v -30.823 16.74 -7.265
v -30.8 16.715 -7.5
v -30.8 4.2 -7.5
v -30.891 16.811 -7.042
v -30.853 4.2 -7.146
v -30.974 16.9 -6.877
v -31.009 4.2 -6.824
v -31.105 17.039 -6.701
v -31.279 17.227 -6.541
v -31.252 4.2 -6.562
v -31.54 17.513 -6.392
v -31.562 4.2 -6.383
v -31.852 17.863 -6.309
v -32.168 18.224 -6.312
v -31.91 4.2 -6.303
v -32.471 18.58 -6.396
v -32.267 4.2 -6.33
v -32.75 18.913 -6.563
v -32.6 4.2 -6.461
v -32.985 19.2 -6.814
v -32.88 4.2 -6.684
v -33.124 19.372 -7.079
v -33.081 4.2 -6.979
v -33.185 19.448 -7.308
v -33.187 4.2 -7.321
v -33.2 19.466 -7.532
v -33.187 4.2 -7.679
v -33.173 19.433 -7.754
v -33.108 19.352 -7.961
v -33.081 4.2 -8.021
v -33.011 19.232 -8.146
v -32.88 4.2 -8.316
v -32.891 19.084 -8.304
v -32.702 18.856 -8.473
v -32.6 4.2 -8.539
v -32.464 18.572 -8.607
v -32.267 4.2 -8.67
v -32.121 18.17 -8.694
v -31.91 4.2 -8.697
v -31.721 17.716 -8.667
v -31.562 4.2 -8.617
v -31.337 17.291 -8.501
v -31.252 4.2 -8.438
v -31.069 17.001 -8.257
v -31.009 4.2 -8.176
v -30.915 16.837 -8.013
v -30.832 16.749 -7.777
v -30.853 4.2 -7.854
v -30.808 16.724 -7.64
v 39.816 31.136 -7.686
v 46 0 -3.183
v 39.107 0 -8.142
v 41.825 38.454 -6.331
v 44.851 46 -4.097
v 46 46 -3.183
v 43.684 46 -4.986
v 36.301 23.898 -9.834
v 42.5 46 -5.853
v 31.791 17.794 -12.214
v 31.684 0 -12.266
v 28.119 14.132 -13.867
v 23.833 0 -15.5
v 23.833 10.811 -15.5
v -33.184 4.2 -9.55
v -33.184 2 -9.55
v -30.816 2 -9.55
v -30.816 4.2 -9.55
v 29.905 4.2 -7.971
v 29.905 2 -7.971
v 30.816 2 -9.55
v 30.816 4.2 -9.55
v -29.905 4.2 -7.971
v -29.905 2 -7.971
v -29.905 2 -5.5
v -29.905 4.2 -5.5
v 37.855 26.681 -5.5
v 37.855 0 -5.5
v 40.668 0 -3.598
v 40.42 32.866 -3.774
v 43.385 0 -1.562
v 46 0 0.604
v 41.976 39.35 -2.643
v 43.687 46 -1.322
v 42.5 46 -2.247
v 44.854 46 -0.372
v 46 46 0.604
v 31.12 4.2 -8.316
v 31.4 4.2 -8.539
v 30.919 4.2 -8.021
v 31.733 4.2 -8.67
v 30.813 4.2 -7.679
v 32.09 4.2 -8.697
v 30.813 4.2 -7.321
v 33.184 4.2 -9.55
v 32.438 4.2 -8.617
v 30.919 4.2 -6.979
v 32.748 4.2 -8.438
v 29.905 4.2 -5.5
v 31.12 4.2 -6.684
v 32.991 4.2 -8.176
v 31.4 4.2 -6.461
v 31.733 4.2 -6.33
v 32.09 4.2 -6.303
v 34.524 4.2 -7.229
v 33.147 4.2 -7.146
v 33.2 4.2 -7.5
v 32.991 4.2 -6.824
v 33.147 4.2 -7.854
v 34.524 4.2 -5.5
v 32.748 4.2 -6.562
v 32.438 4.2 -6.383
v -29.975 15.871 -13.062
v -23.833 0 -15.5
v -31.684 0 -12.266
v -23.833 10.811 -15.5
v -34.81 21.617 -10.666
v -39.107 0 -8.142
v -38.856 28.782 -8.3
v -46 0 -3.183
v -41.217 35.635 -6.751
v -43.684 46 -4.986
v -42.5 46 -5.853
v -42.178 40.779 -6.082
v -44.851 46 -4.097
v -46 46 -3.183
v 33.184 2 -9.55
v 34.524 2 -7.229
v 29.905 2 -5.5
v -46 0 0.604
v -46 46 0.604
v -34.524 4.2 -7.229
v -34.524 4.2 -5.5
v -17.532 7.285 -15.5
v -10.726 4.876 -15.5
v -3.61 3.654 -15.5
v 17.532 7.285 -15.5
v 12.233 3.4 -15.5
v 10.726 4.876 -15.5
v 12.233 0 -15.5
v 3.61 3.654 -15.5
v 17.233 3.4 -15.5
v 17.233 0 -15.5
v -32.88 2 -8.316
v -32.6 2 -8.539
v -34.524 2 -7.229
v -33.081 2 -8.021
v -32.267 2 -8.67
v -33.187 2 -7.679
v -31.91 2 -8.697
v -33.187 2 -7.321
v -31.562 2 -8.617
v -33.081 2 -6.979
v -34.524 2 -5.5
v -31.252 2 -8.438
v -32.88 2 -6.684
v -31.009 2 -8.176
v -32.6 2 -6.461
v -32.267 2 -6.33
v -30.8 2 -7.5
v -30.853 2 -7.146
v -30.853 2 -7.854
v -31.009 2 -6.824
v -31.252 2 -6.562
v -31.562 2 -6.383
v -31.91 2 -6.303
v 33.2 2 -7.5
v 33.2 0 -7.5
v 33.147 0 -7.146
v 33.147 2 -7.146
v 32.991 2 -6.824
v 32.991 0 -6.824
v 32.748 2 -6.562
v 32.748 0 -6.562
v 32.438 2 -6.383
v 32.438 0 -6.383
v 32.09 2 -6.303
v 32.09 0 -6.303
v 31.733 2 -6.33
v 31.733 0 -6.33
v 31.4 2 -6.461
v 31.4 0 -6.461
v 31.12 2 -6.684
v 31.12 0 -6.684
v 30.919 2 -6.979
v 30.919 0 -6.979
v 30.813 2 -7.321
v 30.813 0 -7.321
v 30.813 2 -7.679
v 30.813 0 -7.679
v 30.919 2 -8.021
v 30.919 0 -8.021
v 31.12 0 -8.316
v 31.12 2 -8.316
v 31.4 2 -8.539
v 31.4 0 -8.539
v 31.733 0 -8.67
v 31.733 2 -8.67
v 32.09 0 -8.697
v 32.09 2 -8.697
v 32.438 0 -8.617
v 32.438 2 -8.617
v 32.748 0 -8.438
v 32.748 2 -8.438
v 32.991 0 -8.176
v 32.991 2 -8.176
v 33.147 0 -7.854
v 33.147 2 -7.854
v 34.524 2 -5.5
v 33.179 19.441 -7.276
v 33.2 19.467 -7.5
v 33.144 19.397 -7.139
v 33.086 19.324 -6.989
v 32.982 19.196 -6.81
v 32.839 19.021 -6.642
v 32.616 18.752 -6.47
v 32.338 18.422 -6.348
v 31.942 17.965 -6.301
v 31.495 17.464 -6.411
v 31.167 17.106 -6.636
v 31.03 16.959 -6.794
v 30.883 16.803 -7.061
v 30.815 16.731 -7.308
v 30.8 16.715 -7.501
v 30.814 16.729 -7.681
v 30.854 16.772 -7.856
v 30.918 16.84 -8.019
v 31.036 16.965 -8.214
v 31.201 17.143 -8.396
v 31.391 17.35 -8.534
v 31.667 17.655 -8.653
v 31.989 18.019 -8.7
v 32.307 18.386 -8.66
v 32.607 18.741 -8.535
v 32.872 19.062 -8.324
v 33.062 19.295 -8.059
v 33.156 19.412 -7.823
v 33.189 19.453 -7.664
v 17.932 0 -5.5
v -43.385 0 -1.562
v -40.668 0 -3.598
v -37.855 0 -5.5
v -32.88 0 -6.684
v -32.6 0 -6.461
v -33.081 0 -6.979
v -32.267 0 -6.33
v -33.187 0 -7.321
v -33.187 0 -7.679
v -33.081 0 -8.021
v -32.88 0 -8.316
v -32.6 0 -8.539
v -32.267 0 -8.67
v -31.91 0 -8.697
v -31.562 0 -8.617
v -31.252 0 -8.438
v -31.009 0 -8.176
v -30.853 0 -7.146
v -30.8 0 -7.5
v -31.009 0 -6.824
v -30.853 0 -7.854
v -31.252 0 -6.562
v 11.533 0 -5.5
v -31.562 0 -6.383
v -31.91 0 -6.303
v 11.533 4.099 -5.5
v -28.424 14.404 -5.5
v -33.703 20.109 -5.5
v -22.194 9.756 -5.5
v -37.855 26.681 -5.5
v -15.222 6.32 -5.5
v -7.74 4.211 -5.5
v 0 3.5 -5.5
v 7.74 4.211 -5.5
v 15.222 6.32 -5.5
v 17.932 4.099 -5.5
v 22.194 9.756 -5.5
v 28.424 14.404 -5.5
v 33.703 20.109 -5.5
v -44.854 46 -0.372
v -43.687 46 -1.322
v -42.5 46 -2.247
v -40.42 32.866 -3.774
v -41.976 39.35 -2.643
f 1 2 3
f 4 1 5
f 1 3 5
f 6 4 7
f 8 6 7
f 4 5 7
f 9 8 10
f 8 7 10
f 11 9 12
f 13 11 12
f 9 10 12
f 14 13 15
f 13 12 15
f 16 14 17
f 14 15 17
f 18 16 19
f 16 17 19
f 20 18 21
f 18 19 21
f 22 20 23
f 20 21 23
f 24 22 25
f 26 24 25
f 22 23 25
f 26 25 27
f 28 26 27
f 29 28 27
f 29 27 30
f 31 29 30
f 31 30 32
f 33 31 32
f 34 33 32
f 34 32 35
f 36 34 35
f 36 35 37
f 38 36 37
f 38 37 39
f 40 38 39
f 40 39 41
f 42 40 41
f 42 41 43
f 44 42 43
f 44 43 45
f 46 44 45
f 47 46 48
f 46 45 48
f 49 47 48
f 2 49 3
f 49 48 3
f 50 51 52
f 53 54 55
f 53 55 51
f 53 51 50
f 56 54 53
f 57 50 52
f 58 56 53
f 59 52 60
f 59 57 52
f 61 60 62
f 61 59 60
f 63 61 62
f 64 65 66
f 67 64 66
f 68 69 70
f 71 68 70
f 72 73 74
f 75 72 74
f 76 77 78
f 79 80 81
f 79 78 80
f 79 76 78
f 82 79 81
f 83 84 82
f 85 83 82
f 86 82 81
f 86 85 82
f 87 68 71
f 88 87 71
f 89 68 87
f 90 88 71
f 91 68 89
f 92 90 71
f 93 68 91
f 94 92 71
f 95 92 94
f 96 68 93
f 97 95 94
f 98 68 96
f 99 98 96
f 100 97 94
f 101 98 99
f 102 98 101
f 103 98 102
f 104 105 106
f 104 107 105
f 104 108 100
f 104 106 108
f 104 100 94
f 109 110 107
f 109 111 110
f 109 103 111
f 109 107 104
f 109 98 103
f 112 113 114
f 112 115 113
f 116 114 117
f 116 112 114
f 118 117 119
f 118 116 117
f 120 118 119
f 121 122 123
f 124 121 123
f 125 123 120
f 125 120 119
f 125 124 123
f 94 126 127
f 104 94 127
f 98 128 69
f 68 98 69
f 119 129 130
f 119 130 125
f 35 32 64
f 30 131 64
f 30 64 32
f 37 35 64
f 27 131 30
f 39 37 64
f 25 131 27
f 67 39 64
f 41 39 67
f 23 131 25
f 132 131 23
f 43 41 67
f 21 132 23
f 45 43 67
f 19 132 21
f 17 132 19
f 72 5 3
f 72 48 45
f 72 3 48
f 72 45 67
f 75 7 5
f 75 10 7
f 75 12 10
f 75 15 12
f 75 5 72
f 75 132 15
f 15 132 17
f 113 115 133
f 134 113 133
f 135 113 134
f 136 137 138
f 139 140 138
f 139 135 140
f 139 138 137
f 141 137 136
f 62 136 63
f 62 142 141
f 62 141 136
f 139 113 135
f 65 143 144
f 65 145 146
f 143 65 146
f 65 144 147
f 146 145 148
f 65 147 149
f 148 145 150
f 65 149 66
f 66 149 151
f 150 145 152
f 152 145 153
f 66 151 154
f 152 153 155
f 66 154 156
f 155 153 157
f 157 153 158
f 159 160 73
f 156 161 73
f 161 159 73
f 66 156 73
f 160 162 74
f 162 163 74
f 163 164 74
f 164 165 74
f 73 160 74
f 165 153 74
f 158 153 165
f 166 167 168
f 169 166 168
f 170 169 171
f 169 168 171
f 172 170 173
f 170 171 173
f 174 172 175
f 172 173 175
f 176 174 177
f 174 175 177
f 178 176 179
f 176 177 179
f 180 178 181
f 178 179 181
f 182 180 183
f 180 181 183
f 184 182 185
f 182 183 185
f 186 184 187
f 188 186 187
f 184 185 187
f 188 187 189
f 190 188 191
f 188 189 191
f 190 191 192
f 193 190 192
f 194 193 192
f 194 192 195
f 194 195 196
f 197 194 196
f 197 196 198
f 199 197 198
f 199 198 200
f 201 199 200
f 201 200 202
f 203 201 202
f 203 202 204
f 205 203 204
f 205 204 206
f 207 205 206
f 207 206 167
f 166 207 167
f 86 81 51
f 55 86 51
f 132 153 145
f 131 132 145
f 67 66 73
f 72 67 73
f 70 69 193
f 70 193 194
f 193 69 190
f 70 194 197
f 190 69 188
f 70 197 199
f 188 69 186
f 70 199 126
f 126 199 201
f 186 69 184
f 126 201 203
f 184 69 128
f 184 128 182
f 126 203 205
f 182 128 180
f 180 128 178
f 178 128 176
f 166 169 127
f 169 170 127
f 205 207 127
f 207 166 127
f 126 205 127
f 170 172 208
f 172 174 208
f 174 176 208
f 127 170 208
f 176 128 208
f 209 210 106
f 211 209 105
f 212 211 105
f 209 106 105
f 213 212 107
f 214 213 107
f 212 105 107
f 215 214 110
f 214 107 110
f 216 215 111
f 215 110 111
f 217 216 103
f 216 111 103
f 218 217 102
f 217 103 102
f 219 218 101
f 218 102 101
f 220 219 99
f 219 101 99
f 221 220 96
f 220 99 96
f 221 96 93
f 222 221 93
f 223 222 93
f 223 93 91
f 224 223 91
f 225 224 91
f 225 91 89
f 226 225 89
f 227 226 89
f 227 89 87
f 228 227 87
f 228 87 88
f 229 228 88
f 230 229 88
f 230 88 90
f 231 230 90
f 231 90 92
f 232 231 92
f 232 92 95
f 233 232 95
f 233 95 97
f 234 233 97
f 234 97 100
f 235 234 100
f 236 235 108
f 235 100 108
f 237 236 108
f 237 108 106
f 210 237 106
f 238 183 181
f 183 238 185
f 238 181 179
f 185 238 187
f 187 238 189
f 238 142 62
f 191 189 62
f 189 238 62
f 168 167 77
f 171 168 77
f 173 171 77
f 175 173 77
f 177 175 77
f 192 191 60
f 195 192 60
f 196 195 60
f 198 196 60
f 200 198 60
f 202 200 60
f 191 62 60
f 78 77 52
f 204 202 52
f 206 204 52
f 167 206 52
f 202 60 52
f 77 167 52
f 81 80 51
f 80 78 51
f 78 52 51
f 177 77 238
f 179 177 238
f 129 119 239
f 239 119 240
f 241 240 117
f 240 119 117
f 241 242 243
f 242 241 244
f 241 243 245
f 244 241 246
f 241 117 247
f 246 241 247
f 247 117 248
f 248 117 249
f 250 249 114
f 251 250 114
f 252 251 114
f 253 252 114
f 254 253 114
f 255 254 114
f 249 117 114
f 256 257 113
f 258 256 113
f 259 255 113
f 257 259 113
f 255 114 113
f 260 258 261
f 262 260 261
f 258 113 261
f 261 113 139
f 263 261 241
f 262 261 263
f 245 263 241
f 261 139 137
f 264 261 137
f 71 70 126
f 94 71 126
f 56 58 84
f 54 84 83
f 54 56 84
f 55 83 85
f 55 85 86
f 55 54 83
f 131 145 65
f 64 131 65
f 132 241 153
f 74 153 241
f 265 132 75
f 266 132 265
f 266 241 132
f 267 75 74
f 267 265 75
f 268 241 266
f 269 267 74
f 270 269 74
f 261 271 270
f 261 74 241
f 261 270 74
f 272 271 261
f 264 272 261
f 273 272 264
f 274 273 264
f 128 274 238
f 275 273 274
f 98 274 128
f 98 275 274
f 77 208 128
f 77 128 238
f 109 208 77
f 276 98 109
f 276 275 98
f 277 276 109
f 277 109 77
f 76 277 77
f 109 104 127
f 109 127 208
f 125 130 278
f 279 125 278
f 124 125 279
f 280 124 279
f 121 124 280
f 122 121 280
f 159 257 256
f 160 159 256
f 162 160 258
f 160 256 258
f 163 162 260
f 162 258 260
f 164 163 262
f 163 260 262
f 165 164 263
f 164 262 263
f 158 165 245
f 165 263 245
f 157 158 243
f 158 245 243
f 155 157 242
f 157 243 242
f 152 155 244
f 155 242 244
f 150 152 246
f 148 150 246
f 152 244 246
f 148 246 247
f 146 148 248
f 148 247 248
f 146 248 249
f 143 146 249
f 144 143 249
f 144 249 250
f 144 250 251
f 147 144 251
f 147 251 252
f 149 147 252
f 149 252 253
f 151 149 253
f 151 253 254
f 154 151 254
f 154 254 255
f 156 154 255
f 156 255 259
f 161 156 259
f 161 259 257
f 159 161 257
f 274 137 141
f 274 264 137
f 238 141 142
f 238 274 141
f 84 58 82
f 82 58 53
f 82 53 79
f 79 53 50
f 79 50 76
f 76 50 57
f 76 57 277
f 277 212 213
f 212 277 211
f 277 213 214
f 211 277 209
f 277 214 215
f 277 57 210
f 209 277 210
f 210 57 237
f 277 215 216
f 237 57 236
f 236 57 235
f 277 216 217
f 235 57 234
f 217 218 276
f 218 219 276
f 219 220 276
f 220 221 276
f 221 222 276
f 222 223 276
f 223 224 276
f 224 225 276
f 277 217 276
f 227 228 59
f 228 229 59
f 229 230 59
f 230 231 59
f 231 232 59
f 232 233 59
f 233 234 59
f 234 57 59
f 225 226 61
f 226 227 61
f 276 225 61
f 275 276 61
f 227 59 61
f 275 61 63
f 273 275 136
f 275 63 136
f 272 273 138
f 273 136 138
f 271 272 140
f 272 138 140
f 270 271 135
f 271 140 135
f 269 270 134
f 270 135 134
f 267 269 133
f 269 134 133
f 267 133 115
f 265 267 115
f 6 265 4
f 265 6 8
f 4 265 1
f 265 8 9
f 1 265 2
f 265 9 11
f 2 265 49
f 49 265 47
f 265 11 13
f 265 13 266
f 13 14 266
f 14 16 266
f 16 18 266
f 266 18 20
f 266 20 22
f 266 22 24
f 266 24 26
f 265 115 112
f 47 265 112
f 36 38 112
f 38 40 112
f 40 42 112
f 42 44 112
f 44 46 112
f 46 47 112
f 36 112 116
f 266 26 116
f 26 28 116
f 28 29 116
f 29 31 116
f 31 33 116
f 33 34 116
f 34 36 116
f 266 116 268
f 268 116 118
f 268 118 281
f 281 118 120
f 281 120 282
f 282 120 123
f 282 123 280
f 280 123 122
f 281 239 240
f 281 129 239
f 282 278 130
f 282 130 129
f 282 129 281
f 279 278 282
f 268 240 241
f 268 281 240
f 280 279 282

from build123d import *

# Parameters (mm, degrees)
SKETCH1_W           = 92
SKETCH1_H           = 31
BOSS_EXTRUDE1_DEPTH = 46
SKETCH2_R           = 103
SKETCH2_R_2         = 73
CUT_EXTRUDE1_DEPTH  = 47
SKETCH7_R           = 1.2
CUT_EXTRUDE5_DEPTH  = 47
CUT_EXTRUDE2_DEPTH  = 47
SKETCH5_R           = 42.5
CUT_EXTRUDE4_DEPTH  = 17.103780853
CUT_EXTRUDE6_START  = -2
CUT_EXTRUDE6_DEPTH  = 2.2
SKETCH9_W           = 5
SKETCH9_H           = 3.4
CUT_EXTRUDE7_DEPTH  = 17.103780953
CUT_EXTRUDE7_TAPER  = -4


with BuildPart() as part:
    # Sketch1 → Boss-Extrude1 (new body)
    with BuildSketch(Plane(origin=(0, 0, 0), x_dir=(1, 0, 0), z_dir=(0, 1, 0))):
        Rectangle(SKETCH1_W, SKETCH1_H)
    extrude(amount=BOSS_EXTRUDE1_DEPTH)

    # Sketch2 → Cut-Extrude1 (cut, through all)
    with BuildSketch(Plane(origin=(0, 46, 0), x_dir=(1, 0, 0), z_dir=(0, 1, 0))):
        with Locations((0, -53.5)):
            Circle(SKETCH2_R)
        with Locations((0, -53.5)):
            Circle(SKETCH2_R_2, mode=Mode.SUBTRACT)
    extrude(amount=-CUT_EXTRUDE1_DEPTH, mode=Mode.SUBTRACT)

    # Sketch7 → Cut-Extrude5 (cut, through all)
    with BuildSketch(Plane.XZ):
        with Locations((-32, -7.5)):
            Circle(SKETCH7_R)
        with Locations((32, -7.5)):
            Circle(SKETCH7_R)
    extrude(amount=-CUT_EXTRUDE5_DEPTH, mode=Mode.SUBTRACT)

    # Sketch3 → Cut-Extrude2 (cut, through all)
    with BuildSketch(Plane(origin=(0, 46, 0), x_dir=(1, 0, 0), z_dir=(0, 1, 0))):
        with BuildLine():
            Line((-37.855118544, 5.5), (37.855118544, 5.5))
            ThreePointArc((37.855118544, 5.5), (0, -123.6), (-37.855118544, 5.5))
        make_face()
    extrude(amount=-CUT_EXTRUDE2_DEPTH, mode=Mode.SUBTRACT)

    # Sketch5 → Cut-Extrude4 (cut, through all)
    with BuildSketch(Plane(origin=(0, 0, -15.5), x_dir=(-1, 0, 0), z_dir=(0, 0, -1))):
        with Locations((0, 46)):
            Circle(SKETCH5_R)
    extrude(amount=-CUT_EXTRUDE4_DEPTH, mode=Mode.SUBTRACT)

    # Sketch8 → Cut-Extrude6 (cut)
    with BuildSketch(Plane.XZ.offset(CUT_EXTRUDE6_START)):
        Polygon((-34.523561667, -7.229062977), (-33.183568052, -9.55), (-30.816431948, -9.55), (-29.904759513, -7.970937023), (-29.904759513, -4.97225781), (-34.523561667, -4.97225781), align=None)
        Polygon((29.904759513, -4.97225781), (29.904759513, -7.970937023), (30.816431948, -9.55), (33.183568052, -9.55), (34.523561667, -7.229062977), (34.523561667, -4.97225781), align=None)
    extrude(amount=-CUT_EXTRUDE6_DEPTH, mode=Mode.SUBTRACT)

    # Sketch9 → Cut-Extrude7 (cut, through all)
    with BuildSketch(Plane(origin=(0, 0, -15.5), x_dir=(-1, 0, 0), z_dir=(0, 0, -1))):
        with Locations((-14.732750576, 1.7)):
            Rectangle(SKETCH9_W, SKETCH9_H)
    extrude(amount=-CUT_EXTRUDE7_DEPTH, taper=CUT_EXTRUDE7_TAPER, mode=Mode.SUBTRACT)


solid = part.part
